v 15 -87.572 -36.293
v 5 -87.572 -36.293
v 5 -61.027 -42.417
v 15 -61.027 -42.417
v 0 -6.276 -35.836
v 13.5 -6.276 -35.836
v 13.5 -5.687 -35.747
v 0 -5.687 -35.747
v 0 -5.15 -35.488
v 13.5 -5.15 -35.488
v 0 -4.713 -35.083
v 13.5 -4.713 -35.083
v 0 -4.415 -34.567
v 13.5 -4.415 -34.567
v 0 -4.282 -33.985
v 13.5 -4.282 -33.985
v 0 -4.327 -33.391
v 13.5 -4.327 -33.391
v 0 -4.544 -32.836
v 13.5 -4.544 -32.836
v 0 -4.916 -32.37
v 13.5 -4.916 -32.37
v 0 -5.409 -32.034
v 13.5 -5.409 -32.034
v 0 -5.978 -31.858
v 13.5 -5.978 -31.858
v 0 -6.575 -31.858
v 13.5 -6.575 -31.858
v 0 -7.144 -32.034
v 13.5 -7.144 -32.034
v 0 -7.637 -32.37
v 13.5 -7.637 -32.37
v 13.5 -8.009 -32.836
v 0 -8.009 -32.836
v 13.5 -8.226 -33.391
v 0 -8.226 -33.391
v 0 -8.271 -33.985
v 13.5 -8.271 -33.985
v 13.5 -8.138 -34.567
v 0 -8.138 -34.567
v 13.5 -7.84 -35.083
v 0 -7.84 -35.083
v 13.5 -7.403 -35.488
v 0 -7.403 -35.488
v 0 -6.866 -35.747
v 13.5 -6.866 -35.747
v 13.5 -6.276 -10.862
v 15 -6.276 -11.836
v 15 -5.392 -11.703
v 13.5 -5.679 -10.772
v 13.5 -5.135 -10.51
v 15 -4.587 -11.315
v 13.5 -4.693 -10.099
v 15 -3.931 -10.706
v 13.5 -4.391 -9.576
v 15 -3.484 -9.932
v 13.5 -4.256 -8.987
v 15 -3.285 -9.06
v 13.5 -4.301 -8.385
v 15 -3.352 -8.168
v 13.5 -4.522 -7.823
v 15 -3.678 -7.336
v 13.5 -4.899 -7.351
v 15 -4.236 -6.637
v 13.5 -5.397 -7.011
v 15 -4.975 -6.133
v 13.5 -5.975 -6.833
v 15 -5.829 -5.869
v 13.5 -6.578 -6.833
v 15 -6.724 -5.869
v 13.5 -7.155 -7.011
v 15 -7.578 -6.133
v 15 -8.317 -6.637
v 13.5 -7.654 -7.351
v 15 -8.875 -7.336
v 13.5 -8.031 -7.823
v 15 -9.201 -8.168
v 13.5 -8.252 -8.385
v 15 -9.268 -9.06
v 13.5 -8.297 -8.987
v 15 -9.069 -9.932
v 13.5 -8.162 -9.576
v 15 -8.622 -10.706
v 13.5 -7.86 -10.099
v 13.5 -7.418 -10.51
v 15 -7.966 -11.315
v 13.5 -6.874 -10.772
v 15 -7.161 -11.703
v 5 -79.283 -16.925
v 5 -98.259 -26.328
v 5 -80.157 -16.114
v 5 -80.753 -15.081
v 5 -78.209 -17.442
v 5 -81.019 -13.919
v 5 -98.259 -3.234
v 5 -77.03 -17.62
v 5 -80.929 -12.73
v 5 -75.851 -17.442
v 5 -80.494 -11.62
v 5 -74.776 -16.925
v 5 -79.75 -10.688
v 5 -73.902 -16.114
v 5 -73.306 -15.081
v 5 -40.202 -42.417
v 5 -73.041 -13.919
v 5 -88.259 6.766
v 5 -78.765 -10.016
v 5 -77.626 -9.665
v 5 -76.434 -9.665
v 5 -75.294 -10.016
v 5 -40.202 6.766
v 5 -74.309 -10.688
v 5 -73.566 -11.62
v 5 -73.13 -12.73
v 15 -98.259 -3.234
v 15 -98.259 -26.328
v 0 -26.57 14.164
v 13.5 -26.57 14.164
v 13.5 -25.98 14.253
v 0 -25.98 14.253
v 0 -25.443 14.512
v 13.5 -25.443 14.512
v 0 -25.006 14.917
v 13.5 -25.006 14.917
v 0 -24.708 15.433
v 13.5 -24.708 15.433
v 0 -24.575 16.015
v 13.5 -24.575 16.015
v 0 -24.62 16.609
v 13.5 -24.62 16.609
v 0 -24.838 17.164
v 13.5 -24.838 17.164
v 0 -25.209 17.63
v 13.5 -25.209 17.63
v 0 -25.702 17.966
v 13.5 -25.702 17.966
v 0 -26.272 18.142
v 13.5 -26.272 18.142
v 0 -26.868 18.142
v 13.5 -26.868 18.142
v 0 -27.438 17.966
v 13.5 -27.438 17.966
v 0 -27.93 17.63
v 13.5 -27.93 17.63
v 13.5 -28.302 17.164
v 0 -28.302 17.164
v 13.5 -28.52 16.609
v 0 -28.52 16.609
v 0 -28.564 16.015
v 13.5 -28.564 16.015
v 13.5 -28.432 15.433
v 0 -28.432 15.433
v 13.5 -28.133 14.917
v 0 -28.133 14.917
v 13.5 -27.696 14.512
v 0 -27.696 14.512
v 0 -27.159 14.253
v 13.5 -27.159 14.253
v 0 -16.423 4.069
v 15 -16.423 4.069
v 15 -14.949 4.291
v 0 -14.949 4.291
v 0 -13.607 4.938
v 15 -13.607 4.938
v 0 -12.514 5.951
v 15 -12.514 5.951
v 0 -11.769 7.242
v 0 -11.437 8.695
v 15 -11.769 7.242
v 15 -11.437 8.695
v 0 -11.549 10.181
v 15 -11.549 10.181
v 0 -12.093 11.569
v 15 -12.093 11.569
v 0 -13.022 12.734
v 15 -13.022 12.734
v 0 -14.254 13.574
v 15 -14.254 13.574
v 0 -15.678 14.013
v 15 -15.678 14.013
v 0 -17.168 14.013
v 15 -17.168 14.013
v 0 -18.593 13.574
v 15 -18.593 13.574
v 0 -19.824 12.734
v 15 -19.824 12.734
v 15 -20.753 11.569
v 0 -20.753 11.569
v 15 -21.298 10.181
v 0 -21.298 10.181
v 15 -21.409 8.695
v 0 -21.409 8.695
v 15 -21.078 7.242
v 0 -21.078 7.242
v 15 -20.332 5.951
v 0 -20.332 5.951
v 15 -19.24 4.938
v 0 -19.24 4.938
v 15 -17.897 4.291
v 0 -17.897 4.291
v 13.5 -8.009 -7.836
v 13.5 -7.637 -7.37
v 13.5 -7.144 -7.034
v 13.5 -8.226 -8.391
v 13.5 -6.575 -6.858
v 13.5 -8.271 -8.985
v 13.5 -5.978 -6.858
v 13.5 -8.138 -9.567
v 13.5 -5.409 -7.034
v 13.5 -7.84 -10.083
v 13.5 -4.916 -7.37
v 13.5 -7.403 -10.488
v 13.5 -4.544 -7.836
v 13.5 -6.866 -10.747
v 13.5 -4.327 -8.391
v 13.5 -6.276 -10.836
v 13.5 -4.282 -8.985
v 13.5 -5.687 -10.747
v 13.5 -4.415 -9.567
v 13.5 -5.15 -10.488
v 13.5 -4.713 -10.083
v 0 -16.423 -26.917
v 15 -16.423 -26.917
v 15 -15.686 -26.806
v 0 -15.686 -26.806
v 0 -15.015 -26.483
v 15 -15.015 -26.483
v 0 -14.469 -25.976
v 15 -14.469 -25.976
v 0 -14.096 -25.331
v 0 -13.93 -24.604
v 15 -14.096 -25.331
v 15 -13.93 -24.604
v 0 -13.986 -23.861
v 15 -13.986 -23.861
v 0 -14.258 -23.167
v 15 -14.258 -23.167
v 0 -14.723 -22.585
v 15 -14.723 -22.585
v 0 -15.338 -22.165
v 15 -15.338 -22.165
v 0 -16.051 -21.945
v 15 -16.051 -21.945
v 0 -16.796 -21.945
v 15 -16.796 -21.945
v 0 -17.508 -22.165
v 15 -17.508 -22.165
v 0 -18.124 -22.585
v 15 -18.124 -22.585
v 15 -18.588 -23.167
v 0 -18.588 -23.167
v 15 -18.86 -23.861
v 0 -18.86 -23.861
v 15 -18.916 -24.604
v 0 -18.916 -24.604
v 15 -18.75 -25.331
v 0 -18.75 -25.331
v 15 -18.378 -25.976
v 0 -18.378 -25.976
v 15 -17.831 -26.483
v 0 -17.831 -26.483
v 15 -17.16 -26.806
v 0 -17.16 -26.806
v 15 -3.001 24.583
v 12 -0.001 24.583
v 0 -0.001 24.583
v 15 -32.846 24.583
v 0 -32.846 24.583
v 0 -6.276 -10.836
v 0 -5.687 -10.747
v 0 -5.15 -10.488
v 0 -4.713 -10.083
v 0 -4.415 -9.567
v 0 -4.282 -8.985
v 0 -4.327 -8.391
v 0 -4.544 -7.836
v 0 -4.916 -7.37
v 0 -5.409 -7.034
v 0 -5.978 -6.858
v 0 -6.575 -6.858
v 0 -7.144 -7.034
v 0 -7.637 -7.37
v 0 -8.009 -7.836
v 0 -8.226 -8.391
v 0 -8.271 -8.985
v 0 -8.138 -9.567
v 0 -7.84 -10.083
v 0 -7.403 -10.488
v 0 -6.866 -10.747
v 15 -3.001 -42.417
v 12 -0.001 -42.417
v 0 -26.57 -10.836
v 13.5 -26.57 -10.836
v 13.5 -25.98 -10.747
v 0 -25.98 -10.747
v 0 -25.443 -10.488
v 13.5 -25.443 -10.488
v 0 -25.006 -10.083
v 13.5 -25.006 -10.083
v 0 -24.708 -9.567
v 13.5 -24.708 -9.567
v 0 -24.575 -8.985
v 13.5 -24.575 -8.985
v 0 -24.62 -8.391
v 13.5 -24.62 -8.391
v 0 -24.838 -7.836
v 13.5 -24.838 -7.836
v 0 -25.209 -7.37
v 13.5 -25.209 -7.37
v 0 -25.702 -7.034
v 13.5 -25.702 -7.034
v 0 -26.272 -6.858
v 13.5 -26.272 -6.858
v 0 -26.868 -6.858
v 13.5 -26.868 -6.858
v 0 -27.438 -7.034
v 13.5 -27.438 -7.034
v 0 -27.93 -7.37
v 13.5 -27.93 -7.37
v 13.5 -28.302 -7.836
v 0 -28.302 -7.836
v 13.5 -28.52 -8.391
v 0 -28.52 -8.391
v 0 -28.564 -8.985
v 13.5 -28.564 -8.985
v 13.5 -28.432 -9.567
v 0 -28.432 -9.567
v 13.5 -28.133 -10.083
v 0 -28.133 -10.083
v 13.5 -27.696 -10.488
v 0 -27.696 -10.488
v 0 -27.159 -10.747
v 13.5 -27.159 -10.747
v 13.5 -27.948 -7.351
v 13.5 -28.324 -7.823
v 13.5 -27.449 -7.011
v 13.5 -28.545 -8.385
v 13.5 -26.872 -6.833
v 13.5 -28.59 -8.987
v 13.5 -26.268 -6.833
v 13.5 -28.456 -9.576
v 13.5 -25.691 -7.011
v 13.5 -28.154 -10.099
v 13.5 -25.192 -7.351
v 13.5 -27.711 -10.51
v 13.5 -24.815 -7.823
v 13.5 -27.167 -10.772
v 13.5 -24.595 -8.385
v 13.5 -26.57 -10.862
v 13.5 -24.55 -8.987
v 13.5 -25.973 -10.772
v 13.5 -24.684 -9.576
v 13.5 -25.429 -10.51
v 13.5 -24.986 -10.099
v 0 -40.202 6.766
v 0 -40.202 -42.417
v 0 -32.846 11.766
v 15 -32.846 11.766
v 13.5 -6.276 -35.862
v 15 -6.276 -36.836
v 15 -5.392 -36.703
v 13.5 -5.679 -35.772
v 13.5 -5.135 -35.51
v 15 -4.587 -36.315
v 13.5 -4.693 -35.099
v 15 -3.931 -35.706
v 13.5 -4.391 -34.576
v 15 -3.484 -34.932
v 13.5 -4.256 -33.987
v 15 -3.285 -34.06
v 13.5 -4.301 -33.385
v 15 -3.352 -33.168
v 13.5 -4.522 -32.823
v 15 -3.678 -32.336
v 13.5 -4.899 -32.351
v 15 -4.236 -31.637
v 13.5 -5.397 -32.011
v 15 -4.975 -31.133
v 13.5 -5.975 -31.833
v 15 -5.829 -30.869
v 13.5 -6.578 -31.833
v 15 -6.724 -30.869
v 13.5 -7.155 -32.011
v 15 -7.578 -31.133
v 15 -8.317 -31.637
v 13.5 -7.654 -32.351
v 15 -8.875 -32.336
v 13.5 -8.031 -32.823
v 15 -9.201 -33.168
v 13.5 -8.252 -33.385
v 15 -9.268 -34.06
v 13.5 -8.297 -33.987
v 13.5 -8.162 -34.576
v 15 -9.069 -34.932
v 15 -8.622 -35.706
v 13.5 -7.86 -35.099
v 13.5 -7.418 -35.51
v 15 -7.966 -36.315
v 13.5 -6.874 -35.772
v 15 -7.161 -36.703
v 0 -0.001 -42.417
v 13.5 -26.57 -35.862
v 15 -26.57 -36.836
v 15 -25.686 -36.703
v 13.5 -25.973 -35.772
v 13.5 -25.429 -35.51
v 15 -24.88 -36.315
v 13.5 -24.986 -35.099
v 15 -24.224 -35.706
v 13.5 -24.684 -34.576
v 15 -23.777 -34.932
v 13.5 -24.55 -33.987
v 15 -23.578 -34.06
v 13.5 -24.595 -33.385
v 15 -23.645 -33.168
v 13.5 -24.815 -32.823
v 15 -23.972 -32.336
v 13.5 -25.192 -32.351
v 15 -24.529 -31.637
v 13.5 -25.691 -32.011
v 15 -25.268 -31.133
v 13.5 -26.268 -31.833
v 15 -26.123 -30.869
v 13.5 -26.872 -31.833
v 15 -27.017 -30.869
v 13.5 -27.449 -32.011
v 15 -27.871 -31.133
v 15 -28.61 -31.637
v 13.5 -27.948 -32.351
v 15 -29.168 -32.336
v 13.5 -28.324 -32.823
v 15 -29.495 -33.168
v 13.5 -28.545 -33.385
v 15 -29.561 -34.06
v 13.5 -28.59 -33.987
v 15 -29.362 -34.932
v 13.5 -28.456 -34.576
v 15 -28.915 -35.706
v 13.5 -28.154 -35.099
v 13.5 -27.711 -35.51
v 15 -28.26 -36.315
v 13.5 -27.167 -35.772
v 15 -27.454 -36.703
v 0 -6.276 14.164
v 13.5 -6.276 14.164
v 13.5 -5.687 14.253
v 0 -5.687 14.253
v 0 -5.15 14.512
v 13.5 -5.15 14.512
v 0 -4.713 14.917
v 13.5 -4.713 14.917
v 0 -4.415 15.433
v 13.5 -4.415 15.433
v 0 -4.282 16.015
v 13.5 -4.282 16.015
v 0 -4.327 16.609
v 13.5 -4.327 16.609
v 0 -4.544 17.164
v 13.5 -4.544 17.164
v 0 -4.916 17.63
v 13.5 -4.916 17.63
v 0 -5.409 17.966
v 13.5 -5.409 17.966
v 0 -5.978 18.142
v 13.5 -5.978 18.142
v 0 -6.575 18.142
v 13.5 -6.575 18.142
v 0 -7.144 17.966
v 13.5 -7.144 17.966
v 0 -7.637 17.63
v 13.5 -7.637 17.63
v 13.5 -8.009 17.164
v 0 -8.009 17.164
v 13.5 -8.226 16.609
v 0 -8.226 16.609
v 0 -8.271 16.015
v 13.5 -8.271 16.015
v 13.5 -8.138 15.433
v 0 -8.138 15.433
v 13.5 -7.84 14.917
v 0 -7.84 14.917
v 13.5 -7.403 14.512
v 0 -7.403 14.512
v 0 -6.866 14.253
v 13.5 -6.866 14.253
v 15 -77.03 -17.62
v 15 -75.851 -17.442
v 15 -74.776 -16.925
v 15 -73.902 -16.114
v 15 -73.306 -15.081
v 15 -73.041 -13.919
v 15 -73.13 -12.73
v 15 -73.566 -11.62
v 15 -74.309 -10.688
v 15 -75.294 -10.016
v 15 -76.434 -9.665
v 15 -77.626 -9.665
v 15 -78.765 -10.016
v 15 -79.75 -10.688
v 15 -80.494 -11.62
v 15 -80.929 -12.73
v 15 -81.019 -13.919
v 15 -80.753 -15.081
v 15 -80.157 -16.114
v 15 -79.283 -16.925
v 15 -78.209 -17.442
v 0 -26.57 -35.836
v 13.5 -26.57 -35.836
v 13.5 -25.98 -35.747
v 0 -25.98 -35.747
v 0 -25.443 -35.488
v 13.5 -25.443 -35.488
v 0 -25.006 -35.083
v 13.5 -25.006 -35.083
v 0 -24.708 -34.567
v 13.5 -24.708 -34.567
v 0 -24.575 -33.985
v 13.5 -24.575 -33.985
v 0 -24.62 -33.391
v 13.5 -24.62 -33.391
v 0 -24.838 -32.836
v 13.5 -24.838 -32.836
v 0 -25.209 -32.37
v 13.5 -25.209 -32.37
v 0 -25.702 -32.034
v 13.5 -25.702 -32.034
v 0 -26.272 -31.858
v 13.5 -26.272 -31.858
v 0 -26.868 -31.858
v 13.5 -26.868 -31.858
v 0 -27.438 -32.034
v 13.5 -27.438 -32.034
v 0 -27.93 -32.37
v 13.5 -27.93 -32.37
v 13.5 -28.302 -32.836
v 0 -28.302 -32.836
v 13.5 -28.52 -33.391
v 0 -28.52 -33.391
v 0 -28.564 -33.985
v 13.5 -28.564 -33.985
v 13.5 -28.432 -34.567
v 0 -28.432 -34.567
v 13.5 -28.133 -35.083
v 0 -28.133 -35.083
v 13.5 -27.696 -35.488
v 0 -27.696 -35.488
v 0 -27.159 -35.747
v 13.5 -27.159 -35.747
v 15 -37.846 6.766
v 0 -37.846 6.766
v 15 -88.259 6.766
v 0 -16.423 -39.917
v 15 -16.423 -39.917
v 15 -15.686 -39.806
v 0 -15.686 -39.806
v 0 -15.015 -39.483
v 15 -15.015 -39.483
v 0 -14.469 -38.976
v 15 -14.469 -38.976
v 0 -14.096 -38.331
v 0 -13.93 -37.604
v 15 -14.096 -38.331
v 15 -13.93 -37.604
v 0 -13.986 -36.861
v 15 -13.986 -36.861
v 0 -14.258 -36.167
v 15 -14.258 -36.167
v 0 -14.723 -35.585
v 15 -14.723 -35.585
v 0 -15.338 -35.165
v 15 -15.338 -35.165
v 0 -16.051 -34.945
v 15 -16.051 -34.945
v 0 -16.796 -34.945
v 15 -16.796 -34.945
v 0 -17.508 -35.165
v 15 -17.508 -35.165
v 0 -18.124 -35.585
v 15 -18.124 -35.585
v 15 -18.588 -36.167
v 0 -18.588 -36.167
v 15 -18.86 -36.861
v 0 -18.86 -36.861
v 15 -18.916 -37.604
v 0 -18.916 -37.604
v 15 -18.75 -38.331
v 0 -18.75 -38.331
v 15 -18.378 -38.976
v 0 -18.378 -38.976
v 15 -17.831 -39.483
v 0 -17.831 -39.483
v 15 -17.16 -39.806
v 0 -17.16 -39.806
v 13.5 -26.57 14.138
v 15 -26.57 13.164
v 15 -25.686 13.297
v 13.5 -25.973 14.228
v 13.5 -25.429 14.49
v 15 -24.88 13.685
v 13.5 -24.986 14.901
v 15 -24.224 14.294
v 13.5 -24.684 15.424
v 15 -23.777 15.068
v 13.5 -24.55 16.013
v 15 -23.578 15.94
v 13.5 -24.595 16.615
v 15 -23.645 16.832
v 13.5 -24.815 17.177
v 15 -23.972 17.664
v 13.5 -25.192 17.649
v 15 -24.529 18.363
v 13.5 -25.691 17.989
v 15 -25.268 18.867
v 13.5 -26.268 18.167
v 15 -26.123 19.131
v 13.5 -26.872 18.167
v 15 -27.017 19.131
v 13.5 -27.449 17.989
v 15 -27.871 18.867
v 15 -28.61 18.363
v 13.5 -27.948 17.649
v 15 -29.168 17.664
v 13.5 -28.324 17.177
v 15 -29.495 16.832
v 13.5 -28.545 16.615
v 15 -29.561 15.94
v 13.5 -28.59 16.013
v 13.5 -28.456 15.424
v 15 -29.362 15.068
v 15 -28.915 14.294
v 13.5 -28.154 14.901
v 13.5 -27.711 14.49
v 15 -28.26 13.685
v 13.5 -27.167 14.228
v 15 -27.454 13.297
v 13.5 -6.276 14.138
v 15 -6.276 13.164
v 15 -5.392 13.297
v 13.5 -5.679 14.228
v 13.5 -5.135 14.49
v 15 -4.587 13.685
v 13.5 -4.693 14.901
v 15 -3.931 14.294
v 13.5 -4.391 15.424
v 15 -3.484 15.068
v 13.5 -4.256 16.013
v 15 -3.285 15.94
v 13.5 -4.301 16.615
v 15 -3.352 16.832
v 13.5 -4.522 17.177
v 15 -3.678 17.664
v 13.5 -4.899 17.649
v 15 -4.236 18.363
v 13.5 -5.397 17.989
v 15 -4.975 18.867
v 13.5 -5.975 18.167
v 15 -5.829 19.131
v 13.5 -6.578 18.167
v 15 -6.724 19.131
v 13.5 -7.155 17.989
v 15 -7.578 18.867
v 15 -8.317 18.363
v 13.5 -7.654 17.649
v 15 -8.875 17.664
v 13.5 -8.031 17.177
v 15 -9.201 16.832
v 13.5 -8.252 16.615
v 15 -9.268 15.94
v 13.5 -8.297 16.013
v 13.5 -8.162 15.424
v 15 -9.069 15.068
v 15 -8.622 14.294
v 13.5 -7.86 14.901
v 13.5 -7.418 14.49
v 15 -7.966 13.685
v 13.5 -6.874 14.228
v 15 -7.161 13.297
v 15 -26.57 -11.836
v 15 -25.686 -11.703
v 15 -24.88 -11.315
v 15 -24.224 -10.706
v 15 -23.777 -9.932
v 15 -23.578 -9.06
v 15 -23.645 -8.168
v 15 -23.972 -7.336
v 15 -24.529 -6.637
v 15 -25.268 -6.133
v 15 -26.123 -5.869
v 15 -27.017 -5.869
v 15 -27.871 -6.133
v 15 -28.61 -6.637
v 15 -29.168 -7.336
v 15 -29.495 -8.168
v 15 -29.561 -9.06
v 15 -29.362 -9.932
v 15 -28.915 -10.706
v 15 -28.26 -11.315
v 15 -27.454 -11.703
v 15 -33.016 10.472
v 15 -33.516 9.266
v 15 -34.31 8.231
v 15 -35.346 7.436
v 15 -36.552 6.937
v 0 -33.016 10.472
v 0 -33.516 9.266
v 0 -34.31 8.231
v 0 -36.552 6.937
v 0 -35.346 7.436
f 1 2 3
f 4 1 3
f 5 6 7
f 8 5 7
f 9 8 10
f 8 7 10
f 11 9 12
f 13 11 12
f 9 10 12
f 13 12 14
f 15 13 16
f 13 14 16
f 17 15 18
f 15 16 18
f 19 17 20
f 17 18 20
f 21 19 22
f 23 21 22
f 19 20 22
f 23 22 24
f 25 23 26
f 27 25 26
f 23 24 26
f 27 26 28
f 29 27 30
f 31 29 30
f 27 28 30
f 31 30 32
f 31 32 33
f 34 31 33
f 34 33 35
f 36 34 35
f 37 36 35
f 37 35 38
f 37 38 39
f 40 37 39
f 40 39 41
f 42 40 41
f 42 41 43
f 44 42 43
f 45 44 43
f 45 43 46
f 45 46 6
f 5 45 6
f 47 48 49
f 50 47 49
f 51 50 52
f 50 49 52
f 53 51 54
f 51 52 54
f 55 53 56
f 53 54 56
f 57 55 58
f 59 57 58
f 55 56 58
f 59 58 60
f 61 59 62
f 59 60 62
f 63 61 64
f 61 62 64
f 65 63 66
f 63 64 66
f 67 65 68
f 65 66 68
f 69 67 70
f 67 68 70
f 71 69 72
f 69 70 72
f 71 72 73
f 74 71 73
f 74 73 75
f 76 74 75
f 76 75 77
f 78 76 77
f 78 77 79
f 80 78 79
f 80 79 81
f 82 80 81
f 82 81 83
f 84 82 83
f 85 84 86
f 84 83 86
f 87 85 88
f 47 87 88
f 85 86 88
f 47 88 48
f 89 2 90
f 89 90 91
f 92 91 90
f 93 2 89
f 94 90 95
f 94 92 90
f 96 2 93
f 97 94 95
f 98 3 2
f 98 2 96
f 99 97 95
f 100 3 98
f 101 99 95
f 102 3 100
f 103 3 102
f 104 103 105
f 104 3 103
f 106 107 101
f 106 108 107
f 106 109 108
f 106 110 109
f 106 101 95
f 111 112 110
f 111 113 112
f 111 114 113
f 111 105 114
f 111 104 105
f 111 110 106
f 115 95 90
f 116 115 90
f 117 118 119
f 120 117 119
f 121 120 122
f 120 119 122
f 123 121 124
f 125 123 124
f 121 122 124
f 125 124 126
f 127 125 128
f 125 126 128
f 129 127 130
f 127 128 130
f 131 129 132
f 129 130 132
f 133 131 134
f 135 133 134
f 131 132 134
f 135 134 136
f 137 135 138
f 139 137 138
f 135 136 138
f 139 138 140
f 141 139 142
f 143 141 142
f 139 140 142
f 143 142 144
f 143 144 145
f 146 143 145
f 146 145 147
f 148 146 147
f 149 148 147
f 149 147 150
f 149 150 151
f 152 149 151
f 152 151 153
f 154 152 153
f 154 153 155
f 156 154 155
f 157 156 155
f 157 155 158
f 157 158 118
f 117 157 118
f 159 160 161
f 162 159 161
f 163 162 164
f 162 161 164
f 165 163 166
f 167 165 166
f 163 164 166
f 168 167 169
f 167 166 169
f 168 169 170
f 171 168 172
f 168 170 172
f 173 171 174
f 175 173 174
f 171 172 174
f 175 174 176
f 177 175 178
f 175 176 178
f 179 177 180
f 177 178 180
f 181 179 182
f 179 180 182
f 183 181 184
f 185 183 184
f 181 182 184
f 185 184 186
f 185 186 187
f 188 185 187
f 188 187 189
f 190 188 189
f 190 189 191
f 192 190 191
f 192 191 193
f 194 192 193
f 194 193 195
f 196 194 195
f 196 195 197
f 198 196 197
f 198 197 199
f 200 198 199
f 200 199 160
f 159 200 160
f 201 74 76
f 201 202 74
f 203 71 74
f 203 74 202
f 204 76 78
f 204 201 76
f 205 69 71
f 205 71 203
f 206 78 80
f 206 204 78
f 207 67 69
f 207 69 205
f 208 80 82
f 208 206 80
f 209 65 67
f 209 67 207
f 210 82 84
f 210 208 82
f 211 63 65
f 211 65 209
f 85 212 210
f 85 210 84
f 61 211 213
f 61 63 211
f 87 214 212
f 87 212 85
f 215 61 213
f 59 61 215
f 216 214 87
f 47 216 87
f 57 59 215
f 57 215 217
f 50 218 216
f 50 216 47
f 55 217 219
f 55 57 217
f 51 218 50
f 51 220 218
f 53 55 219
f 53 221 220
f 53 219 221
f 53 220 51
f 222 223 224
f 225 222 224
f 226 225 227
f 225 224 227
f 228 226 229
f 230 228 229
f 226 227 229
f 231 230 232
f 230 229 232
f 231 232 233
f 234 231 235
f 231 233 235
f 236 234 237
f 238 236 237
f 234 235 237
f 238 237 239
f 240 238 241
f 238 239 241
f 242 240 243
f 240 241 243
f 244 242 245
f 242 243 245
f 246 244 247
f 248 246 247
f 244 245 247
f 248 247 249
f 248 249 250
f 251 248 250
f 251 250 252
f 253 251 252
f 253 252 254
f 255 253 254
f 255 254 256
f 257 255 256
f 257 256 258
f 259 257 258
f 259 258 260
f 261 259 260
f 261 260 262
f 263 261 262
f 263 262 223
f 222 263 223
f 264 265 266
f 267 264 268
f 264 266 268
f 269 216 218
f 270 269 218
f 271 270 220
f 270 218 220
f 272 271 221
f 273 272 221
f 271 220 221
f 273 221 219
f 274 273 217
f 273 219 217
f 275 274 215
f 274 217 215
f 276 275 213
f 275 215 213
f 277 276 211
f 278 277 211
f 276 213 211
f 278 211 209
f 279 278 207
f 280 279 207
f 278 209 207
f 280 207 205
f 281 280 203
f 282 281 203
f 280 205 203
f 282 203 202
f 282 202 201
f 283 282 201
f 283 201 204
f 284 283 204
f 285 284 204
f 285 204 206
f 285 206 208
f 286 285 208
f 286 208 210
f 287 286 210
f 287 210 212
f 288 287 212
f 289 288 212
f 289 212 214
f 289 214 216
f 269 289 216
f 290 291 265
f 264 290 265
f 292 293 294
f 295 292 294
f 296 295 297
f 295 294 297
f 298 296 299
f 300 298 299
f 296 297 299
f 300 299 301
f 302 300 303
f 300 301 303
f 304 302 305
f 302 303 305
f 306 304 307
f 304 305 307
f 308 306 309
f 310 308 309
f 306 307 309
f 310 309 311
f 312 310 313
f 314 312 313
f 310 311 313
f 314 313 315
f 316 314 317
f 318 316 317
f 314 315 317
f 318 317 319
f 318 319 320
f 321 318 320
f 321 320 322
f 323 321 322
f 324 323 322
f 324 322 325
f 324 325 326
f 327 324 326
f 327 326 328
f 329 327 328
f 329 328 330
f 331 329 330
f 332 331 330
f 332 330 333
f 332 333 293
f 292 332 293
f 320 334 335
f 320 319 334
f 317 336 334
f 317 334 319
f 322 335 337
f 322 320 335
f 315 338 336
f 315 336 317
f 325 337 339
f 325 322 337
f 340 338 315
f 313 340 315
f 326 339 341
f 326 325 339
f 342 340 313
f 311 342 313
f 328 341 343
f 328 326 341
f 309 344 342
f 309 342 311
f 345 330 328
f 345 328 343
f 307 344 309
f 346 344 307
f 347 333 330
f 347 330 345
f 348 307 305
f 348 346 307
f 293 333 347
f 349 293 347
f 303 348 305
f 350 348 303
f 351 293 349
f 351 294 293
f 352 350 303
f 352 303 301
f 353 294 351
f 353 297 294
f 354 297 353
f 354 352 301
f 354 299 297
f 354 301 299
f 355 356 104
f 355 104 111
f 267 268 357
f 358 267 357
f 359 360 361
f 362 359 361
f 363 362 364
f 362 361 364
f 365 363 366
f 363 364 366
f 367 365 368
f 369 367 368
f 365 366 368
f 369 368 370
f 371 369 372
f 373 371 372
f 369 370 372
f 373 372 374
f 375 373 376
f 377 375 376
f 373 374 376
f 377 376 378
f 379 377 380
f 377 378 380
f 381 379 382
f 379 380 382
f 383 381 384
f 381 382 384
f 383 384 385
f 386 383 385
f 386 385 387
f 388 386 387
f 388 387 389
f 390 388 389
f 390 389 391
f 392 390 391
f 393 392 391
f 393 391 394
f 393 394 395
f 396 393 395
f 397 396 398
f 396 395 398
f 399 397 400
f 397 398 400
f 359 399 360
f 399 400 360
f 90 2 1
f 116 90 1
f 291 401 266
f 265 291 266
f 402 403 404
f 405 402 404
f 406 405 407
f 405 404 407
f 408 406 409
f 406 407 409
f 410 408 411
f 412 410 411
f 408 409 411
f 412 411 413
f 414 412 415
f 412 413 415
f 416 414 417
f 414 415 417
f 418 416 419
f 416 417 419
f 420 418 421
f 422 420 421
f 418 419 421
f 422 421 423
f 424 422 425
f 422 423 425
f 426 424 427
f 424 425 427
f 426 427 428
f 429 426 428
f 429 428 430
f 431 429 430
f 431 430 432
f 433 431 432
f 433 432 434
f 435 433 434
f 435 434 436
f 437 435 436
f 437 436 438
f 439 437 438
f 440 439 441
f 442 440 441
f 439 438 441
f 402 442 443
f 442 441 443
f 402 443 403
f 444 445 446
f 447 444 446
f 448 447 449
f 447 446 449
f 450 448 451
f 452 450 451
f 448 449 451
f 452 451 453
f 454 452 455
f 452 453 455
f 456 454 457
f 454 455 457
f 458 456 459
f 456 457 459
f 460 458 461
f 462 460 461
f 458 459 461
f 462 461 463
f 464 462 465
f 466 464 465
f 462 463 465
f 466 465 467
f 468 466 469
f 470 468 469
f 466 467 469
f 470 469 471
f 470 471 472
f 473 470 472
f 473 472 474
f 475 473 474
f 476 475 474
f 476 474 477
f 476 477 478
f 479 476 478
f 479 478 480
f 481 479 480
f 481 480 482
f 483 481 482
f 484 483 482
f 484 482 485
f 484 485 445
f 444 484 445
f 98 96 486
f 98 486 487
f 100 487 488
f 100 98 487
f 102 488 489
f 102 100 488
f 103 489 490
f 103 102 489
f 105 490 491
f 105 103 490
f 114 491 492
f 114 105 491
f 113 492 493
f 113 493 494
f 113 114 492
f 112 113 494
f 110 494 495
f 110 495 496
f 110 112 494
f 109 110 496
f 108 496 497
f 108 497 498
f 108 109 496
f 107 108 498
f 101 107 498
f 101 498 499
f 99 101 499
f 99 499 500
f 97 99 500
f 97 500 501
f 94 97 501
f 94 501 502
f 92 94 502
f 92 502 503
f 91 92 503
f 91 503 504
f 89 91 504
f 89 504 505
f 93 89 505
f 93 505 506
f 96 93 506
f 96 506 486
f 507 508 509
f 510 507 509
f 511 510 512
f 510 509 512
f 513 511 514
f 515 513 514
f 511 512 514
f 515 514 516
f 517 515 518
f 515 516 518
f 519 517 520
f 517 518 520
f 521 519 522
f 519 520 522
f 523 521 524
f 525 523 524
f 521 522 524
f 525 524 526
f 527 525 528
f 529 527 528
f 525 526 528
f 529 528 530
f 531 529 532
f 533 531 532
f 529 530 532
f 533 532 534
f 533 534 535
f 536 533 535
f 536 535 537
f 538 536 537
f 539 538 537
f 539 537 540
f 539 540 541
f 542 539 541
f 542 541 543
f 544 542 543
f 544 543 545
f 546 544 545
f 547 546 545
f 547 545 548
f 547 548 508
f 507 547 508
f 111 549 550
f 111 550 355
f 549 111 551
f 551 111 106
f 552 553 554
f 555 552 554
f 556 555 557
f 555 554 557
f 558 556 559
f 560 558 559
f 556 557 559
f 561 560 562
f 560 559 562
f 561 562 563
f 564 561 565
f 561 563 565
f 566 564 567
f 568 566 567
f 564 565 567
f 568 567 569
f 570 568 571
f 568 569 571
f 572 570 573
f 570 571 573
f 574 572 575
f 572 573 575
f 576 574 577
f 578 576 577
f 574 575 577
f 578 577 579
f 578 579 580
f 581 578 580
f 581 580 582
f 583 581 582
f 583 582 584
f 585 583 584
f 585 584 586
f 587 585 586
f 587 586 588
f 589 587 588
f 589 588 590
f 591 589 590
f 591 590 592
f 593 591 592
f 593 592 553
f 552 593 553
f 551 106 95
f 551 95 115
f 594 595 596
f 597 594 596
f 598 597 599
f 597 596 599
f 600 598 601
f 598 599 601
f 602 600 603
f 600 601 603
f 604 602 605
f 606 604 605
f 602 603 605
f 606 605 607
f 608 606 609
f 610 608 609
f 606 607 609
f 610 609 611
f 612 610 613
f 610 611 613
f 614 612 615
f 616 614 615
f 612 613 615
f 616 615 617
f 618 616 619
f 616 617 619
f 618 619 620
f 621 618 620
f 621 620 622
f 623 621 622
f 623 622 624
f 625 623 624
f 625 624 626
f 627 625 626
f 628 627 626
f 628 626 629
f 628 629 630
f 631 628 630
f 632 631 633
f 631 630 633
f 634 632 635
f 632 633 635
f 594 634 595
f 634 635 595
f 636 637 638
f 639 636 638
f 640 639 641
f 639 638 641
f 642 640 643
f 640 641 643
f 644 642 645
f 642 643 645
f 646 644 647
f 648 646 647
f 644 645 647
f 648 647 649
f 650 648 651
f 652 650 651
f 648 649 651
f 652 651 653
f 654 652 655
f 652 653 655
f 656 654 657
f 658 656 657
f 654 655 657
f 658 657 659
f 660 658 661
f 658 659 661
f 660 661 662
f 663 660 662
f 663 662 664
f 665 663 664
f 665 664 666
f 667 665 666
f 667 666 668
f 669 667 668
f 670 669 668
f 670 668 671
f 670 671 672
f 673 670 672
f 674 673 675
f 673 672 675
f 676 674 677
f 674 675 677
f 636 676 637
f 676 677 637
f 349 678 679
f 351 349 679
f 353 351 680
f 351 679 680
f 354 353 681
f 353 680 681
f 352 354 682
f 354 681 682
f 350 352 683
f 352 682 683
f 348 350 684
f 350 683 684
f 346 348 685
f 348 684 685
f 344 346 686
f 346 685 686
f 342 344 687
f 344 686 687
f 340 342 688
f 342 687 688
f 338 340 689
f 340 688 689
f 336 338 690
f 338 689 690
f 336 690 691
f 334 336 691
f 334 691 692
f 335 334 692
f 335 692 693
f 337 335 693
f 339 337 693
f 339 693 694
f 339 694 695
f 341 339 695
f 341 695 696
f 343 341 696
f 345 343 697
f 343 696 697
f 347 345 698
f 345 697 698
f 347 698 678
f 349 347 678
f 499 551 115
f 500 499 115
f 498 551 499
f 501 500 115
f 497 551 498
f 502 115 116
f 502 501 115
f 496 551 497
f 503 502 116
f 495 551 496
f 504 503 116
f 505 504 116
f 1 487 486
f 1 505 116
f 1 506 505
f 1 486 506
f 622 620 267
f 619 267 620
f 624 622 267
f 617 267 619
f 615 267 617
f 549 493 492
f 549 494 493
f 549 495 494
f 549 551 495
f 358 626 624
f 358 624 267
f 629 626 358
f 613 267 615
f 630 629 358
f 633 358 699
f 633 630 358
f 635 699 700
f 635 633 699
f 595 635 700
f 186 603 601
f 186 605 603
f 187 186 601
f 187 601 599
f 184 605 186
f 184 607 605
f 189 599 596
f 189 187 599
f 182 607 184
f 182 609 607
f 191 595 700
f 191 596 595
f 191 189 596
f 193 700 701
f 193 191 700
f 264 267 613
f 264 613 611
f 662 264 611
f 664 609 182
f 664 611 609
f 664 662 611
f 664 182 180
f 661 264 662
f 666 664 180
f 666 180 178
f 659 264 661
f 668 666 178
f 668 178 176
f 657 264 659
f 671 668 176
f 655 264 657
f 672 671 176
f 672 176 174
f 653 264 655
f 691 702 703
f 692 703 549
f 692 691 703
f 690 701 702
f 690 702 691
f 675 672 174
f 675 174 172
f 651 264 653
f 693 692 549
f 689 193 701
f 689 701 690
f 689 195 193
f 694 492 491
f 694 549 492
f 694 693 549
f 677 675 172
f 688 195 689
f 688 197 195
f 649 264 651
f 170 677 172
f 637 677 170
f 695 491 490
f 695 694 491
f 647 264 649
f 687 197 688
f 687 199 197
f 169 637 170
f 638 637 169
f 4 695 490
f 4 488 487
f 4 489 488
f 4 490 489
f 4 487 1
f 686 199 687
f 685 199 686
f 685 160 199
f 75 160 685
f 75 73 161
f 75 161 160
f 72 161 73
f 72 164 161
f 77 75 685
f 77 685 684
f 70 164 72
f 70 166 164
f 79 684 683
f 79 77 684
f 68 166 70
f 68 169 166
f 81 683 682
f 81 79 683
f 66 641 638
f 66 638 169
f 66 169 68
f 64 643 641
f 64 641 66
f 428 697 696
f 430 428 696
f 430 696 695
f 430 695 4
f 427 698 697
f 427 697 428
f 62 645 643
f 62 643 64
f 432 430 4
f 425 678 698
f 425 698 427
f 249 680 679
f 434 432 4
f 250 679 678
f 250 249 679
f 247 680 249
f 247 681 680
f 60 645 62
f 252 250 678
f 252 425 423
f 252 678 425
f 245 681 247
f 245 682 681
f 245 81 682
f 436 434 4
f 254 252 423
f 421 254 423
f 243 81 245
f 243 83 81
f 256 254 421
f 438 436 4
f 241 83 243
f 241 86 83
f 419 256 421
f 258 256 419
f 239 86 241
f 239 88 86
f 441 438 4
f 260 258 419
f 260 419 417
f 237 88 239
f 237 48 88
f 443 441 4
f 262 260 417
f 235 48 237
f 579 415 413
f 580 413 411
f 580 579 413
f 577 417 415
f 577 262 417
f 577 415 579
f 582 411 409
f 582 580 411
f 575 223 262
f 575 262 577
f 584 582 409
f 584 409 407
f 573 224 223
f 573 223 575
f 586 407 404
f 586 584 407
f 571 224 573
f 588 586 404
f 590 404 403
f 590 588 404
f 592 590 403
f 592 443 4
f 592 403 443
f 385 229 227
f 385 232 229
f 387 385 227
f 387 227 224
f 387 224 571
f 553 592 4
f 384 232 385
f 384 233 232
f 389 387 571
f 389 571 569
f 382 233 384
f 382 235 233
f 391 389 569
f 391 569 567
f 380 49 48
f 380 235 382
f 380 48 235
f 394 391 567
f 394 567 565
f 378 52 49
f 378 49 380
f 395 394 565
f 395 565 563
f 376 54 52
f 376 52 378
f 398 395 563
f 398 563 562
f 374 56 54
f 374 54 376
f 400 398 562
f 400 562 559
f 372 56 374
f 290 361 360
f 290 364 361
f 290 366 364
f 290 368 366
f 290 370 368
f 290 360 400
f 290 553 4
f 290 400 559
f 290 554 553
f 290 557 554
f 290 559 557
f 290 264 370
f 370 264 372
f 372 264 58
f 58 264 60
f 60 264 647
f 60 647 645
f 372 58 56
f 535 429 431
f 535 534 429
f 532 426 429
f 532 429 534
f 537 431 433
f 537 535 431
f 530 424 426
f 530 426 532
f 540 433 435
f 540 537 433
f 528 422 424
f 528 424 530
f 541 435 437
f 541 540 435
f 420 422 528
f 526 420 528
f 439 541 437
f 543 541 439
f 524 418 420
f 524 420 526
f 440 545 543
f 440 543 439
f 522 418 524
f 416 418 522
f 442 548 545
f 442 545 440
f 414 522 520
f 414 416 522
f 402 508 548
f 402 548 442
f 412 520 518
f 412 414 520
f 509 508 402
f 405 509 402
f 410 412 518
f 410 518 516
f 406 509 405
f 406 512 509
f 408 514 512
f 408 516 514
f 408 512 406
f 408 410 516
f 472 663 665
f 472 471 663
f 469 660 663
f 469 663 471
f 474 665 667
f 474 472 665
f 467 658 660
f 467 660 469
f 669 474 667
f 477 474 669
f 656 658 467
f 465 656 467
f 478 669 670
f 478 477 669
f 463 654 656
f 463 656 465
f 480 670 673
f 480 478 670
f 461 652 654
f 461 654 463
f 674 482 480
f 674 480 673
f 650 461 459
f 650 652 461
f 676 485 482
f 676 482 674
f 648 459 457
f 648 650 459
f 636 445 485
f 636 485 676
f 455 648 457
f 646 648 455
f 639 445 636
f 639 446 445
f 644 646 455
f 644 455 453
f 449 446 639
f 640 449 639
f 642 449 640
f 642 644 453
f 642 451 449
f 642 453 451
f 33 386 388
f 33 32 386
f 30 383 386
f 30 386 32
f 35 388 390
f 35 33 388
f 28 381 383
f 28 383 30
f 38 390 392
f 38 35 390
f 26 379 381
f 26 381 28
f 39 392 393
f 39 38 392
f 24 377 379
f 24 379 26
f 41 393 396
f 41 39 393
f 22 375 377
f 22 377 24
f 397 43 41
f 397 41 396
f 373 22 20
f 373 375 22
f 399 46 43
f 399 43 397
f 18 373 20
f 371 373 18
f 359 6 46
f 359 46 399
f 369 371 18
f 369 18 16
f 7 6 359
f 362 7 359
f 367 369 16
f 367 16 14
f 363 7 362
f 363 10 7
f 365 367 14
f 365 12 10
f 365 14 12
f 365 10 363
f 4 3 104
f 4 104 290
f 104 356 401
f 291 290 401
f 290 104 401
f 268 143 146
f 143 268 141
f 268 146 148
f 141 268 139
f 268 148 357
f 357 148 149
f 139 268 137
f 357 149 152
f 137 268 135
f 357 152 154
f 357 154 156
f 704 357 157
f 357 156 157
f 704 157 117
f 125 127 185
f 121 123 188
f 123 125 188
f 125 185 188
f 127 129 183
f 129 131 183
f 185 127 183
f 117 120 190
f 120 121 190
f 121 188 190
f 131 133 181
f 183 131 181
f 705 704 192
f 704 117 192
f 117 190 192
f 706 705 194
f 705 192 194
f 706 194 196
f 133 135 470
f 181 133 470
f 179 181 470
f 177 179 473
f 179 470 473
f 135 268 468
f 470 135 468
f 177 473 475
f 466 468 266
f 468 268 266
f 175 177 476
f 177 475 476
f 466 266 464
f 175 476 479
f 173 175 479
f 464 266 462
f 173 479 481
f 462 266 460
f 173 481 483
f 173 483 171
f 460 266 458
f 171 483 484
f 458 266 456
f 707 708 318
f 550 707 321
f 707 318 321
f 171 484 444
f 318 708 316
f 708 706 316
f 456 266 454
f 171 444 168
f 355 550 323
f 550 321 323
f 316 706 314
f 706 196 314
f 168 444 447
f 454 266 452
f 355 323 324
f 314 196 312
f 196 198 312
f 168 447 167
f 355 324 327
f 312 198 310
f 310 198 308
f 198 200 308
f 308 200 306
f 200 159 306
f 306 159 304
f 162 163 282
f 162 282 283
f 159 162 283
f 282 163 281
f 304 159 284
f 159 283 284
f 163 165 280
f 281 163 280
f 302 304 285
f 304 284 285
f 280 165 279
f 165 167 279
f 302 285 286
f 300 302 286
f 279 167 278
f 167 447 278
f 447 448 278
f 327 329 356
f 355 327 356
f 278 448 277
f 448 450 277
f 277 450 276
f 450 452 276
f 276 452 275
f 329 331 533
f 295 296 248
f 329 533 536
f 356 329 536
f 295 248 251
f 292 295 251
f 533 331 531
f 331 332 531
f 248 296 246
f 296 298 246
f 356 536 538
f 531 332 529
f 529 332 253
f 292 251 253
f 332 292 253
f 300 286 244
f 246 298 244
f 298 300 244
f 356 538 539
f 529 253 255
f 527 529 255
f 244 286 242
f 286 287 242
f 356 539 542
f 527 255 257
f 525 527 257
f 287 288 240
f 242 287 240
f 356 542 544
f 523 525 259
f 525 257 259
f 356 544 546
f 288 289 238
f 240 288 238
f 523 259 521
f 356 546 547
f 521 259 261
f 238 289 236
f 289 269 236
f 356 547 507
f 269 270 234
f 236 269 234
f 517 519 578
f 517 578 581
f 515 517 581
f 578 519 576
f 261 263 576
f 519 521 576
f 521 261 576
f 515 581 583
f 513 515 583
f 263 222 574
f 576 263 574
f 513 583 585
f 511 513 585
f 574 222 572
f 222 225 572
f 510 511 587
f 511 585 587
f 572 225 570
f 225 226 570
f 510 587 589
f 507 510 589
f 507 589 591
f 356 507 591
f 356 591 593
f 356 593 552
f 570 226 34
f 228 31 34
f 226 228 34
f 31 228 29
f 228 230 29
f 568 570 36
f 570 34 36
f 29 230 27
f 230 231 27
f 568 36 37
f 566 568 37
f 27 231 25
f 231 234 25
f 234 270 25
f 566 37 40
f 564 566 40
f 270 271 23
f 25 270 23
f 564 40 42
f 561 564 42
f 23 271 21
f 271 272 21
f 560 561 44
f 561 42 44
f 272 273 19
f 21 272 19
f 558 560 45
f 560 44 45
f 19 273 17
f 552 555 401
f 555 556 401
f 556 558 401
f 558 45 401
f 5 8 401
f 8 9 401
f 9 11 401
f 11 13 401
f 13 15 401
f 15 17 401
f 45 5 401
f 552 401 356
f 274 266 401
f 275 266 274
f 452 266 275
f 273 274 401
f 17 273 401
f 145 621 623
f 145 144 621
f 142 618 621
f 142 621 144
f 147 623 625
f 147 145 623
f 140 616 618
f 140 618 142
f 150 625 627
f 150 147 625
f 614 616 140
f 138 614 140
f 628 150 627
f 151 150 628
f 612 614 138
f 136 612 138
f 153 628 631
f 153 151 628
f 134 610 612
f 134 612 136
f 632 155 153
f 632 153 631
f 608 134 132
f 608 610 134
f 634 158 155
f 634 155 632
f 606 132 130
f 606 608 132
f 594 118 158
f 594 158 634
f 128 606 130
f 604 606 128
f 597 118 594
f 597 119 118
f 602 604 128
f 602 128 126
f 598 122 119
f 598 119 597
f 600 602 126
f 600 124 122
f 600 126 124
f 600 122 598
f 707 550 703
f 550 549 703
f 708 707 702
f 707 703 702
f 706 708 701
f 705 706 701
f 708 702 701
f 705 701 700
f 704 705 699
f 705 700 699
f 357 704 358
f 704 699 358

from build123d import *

# Parameters (mm, degrees)
SKETCH_1_R                      = 4
EXTRUDE_1_DEPTH                 = 15
SKETCH_4_W                      = 59.231964801
SKETCH_4_H                      = 71.825442386
CUT_EXTRUDE_3_DEPTH             = 5
SKETCH_5_R                      = 5
SKETCH_5_R_2                    = 2.5
CUT_EXTRUDE_1_DEPTH             = 109.069666358
CHAMFER_1_SIZE                  = 10
CHAMFER_2_SIZE                  = 7.5
CHAMFER_2_SIZE2                 = 10.967511122
FILLET_1_R                      = 5
SKETCH_6_R                      = 2
CUT_EXTRUDE_2_DEPTH             = 109.069666358
SKETCH_7_R                      = 3
CUT_EXTRUDE_3_2_DEPTH           = 1.5
CUT_EXTRUDE_3_2_DRAFT           = -33
CUT_EXTRUDE_3_2_PROFILE_2_DEPTH = 1.5
CUT_EXTRUDE_3_2_PROFILE_2_DRAFT = -33
CUT_EXTRUDE_3_2_PROFILE_3_DEPTH = 1.5
CUT_EXTRUDE_3_2_PROFILE_3_DRAFT = -33
CUT_EXTRUDE_3_2_PROFILE_4_DEPTH = 1.5
CUT_EXTRUDE_3_2_PROFILE_4_DRAFT = -33
CUT_EXTRUDE_3_2_PROFILE_5_DEPTH = 1.5
CUT_EXTRUDE_3_2_PROFILE_5_DRAFT = -33
CUT_EXTRUDE_3_2_PROFILE_6_DEPTH = 1.5
CUT_EXTRUDE_3_2_PROFILE_6_DRAFT = -33
CHAMFER_3_SIZE                  = 3


with BuildPart() as part:
    # Эскиз1 → Вытянуть1 (new body)
    with BuildSketch(Plane(origin=(0, 0, 0), x_dir=(0, 0, -1), z_dir=(1, 0, 0))):
        Polygon((-24.582546576, -0.000617064), (-24.582546576, -32.845704832), (-6.76628281, -32.845704832), (-6.76628281, -98.258905102), (33.827639979, -98.258905102), (42.417453424, -61.027347877), (42.417453424, -0.000617064), align=None)
        with Locations((13.620132913, -77.029686591)):
            Circle(SKETCH_1_R, mode=Mode.SUBTRACT)
    extrude(amount=EXTRUDE_1_DEPTH)

    # Эскиз4 → Cut-Extrude 3 (cut)
    with BuildSketch(Plane.ZY):
        with Locations((-12.801471023, -76.114894855)):
            Rectangle(SKETCH_4_W, SKETCH_4_H)
    extrude(amount=-CUT_EXTRUDE_3_DEPTH, mode=Mode.SUBTRACT)

    # Эскиз5 → Вырез-Вытянуть1 (cut, through all)
    with BuildSketch(Plane(origin=(15, 0, 0), x_dir=(0, 0, -1), z_dir=(1, 0, 0))):
        with Locations((-9.068801992, -16.42316095)):
            Circle(SKETCH_5_R)
        with Locations((24.417453448, -16.423160953)):
            Circle(SKETCH_5_R_2)
        with Locations((37.417453448, -16.423160948)):
            Circle(SKETCH_5_R_2)
    extrude(amount=-CUT_EXTRUDE_1_DEPTH, mode=Mode.SUBTRACT)

    # Фаска1
    chamfer_1_edges = [part.edges().sort_by_distance(p)[0] for p in [
        (10, -98.258905102, 6.76628281),
    ]]
    chamfer(chamfer_1_edges, length=CHAMFER_1_SIZE)

    # Фаска2
    chamfer_2_edges = [part.edges().sort_by_distance(p)[0] for p in [
        (10, -98.258905102, -33.827639979),
    ]]
    chamfer_2_side = [part.faces().sort_by_distance(p)[0] for p in [
        (10, -98.258905102, -18.530678584),
    ]]
    chamfer(chamfer_2_edges, length=CHAMFER_2_SIZE, length2=CHAMFER_2_SIZE2, reference=chamfer_2_side[0])

    # Скругление1
    fillet_1_edges = [part.edges().sort_by_distance(p)[0] for p in [
        (7.5, -32.845704832, 6.76628281),
    ]]
    fillet(fillet_1_edges, radius=FILLET_1_R)

    # Эскиз6 → Вырез-Вытянуть2 (cut, through all)
    with BuildSketch(Plane(origin=(15, 0, 0), x_dir=(0, 0, -1), z_dir=(1, 0, 0))):
        with Locations((-16.16411161, -6.276498114)):
            Circle(SKETCH_6_R)
        with Locations((8.83588839, -6.276498105)):
            Circle(SKETCH_6_R)
        with Locations((33.83588839, -6.276498095)):
            Circle(SKETCH_6_R)
        with Locations((-16.164111603, -26.569823822)):
            Circle(SKETCH_6_R)
        with Locations((8.835888397, -26.569823813)):
            Circle(SKETCH_6_R)
        with Locations((33.835888397, -26.569823803)):
            Circle(SKETCH_6_R)
    extrude(amount=-CUT_EXTRUDE_2_DEPTH, mode=Mode.SUBTRACT)


with BuildPart() as cut_extrude_3_2_tool:
    # Эскиз7 → Cut-Extrude 3 2 (with draft: the straight prism first)
    with BuildSketch(Plane(origin=(15, 0, 0), x_dir=(0, 0, -1), z_dir=(1, 0, 0))):
        with Locations((-16.16411161, -6.276498114)):
            Circle(SKETCH_7_R)
    extrude(amount=-CUT_EXTRUDE_3_2_DEPTH)
    # Cut-Extrude 3 2: the draft: its side faces are tilted about the plane it starts from
    cut_extrude_3_2_sides = [cut_extrude_3_2_tool.faces().sort_by_distance(p)[0] for p in [
        (14.25, -6.276498114, 19.16411161),
    ]]
    draft(cut_extrude_3_2_sides, Plane(origin=(15, 0, 0), x_dir=(0, 0, -1), z_dir=(1, 0, 0)), CUT_EXTRUDE_3_2_DRAFT)


with BuildPart() as part_1:
    add(part.part)

    # Cut-Extrude 3 2: cut by cut_extrude_3_2_tool
    add(cut_extrude_3_2_tool.part, mode=Mode.SUBTRACT)


with BuildPart() as cut_extrude_3_2_profile_2_tool:
    # Эскиз7 → Cut-Extrude 3 2 profile 2 (with draft: the straight prism first)
    with BuildSketch(Plane(origin=(15, 0, 0), x_dir=(0, 0, -1), z_dir=(1, 0, 0))):
        with Locations((8.83588839, -6.276498105)):
            Circle(SKETCH_7_R)
    extrude(amount=-CUT_EXTRUDE_3_2_PROFILE_2_DEPTH)
    # Cut-Extrude 3 2 profile 2: the draft: its side faces are tilted about the plane it starts from
    cut_extrude_3_2_profile_2_sides = [cut_extrude_3_2_profile_2_tool.faces().sort_by_distance(p)[0] for p in [
        (14.25, -6.276498105, -5.83588839),
    ]]
    draft(cut_extrude_3_2_profile_2_sides, Plane(origin=(15, 0, 0), x_dir=(0, 0, -1), z_dir=(1, 0, 0)), CUT_EXTRUDE_3_2_PROFILE_2_DRAFT)


with BuildPart() as part_2:
    add(part_1.part)

    # Cut-Extrude 3 2 profile 2: cut by cut_extrude_3_2_profile_2_tool
    add(cut_extrude_3_2_profile_2_tool.part, mode=Mode.SUBTRACT)


with BuildPart() as cut_extrude_3_2_profile_3_tool:
    # Эскиз7 → Cut-Extrude 3 2 profile 3 (with draft: the straight prism first)
    with BuildSketch(Plane(origin=(15, 0, 0), x_dir=(0, 0, -1), z_dir=(1, 0, 0))):
        with Locations((33.83588839, -6.276498095)):
            Circle(SKETCH_7_R)
    extrude(amount=-CUT_EXTRUDE_3_2_PROFILE_3_DEPTH)
    # Cut-Extrude 3 2 profile 3: the draft: its side faces are tilted about the plane it starts from
    cut_extrude_3_2_profile_3_sides = [cut_extrude_3_2_profile_3_tool.faces().sort_by_distance(p)[0] for p in [
        (14.25, -6.276498095, -30.83588839),
    ]]
    draft(cut_extrude_3_2_profile_3_sides, Plane(origin=(15, 0, 0), x_dir=(0, 0, -1), z_dir=(1, 0, 0)), CUT_EXTRUDE_3_2_PROFILE_3_DRAFT)


with BuildPart() as part_3:
    add(part_2.part)

    # Cut-Extrude 3 2 profile 3: cut by cut_extrude_3_2_profile_3_tool
    add(cut_extrude_3_2_profile_3_tool.part, mode=Mode.SUBTRACT)


with BuildPart() as cut_extrude_3_2_profile_4_tool:
    # Эскиз7 → Cut-Extrude 3 2 profile 4 (with draft: the straight prism first)
    with BuildSketch(Plane(origin=(15, 0, 0), x_dir=(0, 0, -1), z_dir=(1, 0, 0))):
        with Locations((-16.164111603, -26.569823822)):
            Circle(SKETCH_7_R)
    extrude(amount=-CUT_EXTRUDE_3_2_PROFILE_4_DEPTH)
    # Cut-Extrude 3 2 profile 4: the draft: its side faces are tilted about the plane it starts from
    cut_extrude_3_2_profile_4_sides = [cut_extrude_3_2_profile_4_tool.faces().sort_by_distance(p)[0] for p in [
        (14.25, -26.569823822, 19.164111603),
    ]]
    draft(cut_extrude_3_2_profile_4_sides, Plane(origin=(15, 0, 0), x_dir=(0, 0, -1), z_dir=(1, 0, 0)), CUT_EXTRUDE_3_2_PROFILE_4_DRAFT)


with BuildPart() as part_4:
    add(part_3.part)

    # Cut-Extrude 3 2 profile 4: cut by cut_extrude_3_2_profile_4_tool
    add(cut_extrude_3_2_profile_4_tool.part, mode=Mode.SUBTRACT)


with BuildPart() as cut_extrude_3_2_profile_5_tool:
    # Эскиз7 → Cut-Extrude 3 2 profile 5 (with draft: the straight prism first)
    with BuildSketch(Plane(origin=(15, 0, 0), x_dir=(0, 0, -1), z_dir=(1, 0, 0))):
        with Locations((8.835888397, -26.569823813)):
            Circle(SKETCH_7_R)
    extrude(amount=-CUT_EXTRUDE_3_2_PROFILE_5_DEPTH)
    # Cut-Extrude 3 2 profile 5: the draft: its side faces are tilted about the plane it starts from
    cut_extrude_3_2_profile_5_sides = [cut_extrude_3_2_profile_5_tool.faces().sort_by_distance(p)[0] for p in [
        (14.25, -26.569823813, -5.835888397),
    ]]
    draft(cut_extrude_3_2_profile_5_sides, Plane(origin=(15, 0, 0), x_dir=(0, 0, -1), z_dir=(1, 0, 0)), CUT_EXTRUDE_3_2_PROFILE_5_DRAFT)


with BuildPart() as part_5:
    add(part_4.part)

    # Cut-Extrude 3 2 profile 5: cut by cut_extrude_3_2_profile_5_tool
    add(cut_extrude_3_2_profile_5_tool.part, mode=Mode.SUBTRACT)


with BuildPart() as cut_extrude_3_2_profile_6_tool:
    # Эскиз7 → Cut-Extrude 3 2 profile 6 (with draft: the straight prism first)
    with BuildSketch(Plane(origin=(15, 0, 0), x_dir=(0, 0, -1), z_dir=(1, 0, 0))):
        with Locations((33.835888397, -26.569823803)):
            Circle(SKETCH_7_R)
    extrude(amount=-CUT_EXTRUDE_3_2_PROFILE_6_DEPTH)
    # Cut-Extrude 3 2 profile 6: the draft: its side faces are tilted about the plane it starts from
    cut_extrude_3_2_profile_6_sides = [cut_extrude_3_2_profile_6_tool.faces().sort_by_distance(p)[0] for p in [
        (14.25, -26.569823803, -30.835888397),
    ]]
    draft(cut_extrude_3_2_profile_6_sides, Plane(origin=(15, 0, 0), x_dir=(0, 0, -1), z_dir=(1, 0, 0)), CUT_EXTRUDE_3_2_PROFILE_6_DRAFT)


with BuildPart() as part_6:
    add(part_5.part)

    # Cut-Extrude 3 2 profile 6: cut by cut_extrude_3_2_profile_6_tool
    add(cut_extrude_3_2_profile_6_tool.part, mode=Mode.SUBTRACT)

    # Фаска3
    chamfer_3_edges = [part_6.edges().sort_by_distance(p)[0] for p in [
        (15, -0.000617064, -8.917453424),
    ]]
    chamfer(chamfer_3_edges, length=CHAMFER_3_SIZE)


solid = part_6.part
